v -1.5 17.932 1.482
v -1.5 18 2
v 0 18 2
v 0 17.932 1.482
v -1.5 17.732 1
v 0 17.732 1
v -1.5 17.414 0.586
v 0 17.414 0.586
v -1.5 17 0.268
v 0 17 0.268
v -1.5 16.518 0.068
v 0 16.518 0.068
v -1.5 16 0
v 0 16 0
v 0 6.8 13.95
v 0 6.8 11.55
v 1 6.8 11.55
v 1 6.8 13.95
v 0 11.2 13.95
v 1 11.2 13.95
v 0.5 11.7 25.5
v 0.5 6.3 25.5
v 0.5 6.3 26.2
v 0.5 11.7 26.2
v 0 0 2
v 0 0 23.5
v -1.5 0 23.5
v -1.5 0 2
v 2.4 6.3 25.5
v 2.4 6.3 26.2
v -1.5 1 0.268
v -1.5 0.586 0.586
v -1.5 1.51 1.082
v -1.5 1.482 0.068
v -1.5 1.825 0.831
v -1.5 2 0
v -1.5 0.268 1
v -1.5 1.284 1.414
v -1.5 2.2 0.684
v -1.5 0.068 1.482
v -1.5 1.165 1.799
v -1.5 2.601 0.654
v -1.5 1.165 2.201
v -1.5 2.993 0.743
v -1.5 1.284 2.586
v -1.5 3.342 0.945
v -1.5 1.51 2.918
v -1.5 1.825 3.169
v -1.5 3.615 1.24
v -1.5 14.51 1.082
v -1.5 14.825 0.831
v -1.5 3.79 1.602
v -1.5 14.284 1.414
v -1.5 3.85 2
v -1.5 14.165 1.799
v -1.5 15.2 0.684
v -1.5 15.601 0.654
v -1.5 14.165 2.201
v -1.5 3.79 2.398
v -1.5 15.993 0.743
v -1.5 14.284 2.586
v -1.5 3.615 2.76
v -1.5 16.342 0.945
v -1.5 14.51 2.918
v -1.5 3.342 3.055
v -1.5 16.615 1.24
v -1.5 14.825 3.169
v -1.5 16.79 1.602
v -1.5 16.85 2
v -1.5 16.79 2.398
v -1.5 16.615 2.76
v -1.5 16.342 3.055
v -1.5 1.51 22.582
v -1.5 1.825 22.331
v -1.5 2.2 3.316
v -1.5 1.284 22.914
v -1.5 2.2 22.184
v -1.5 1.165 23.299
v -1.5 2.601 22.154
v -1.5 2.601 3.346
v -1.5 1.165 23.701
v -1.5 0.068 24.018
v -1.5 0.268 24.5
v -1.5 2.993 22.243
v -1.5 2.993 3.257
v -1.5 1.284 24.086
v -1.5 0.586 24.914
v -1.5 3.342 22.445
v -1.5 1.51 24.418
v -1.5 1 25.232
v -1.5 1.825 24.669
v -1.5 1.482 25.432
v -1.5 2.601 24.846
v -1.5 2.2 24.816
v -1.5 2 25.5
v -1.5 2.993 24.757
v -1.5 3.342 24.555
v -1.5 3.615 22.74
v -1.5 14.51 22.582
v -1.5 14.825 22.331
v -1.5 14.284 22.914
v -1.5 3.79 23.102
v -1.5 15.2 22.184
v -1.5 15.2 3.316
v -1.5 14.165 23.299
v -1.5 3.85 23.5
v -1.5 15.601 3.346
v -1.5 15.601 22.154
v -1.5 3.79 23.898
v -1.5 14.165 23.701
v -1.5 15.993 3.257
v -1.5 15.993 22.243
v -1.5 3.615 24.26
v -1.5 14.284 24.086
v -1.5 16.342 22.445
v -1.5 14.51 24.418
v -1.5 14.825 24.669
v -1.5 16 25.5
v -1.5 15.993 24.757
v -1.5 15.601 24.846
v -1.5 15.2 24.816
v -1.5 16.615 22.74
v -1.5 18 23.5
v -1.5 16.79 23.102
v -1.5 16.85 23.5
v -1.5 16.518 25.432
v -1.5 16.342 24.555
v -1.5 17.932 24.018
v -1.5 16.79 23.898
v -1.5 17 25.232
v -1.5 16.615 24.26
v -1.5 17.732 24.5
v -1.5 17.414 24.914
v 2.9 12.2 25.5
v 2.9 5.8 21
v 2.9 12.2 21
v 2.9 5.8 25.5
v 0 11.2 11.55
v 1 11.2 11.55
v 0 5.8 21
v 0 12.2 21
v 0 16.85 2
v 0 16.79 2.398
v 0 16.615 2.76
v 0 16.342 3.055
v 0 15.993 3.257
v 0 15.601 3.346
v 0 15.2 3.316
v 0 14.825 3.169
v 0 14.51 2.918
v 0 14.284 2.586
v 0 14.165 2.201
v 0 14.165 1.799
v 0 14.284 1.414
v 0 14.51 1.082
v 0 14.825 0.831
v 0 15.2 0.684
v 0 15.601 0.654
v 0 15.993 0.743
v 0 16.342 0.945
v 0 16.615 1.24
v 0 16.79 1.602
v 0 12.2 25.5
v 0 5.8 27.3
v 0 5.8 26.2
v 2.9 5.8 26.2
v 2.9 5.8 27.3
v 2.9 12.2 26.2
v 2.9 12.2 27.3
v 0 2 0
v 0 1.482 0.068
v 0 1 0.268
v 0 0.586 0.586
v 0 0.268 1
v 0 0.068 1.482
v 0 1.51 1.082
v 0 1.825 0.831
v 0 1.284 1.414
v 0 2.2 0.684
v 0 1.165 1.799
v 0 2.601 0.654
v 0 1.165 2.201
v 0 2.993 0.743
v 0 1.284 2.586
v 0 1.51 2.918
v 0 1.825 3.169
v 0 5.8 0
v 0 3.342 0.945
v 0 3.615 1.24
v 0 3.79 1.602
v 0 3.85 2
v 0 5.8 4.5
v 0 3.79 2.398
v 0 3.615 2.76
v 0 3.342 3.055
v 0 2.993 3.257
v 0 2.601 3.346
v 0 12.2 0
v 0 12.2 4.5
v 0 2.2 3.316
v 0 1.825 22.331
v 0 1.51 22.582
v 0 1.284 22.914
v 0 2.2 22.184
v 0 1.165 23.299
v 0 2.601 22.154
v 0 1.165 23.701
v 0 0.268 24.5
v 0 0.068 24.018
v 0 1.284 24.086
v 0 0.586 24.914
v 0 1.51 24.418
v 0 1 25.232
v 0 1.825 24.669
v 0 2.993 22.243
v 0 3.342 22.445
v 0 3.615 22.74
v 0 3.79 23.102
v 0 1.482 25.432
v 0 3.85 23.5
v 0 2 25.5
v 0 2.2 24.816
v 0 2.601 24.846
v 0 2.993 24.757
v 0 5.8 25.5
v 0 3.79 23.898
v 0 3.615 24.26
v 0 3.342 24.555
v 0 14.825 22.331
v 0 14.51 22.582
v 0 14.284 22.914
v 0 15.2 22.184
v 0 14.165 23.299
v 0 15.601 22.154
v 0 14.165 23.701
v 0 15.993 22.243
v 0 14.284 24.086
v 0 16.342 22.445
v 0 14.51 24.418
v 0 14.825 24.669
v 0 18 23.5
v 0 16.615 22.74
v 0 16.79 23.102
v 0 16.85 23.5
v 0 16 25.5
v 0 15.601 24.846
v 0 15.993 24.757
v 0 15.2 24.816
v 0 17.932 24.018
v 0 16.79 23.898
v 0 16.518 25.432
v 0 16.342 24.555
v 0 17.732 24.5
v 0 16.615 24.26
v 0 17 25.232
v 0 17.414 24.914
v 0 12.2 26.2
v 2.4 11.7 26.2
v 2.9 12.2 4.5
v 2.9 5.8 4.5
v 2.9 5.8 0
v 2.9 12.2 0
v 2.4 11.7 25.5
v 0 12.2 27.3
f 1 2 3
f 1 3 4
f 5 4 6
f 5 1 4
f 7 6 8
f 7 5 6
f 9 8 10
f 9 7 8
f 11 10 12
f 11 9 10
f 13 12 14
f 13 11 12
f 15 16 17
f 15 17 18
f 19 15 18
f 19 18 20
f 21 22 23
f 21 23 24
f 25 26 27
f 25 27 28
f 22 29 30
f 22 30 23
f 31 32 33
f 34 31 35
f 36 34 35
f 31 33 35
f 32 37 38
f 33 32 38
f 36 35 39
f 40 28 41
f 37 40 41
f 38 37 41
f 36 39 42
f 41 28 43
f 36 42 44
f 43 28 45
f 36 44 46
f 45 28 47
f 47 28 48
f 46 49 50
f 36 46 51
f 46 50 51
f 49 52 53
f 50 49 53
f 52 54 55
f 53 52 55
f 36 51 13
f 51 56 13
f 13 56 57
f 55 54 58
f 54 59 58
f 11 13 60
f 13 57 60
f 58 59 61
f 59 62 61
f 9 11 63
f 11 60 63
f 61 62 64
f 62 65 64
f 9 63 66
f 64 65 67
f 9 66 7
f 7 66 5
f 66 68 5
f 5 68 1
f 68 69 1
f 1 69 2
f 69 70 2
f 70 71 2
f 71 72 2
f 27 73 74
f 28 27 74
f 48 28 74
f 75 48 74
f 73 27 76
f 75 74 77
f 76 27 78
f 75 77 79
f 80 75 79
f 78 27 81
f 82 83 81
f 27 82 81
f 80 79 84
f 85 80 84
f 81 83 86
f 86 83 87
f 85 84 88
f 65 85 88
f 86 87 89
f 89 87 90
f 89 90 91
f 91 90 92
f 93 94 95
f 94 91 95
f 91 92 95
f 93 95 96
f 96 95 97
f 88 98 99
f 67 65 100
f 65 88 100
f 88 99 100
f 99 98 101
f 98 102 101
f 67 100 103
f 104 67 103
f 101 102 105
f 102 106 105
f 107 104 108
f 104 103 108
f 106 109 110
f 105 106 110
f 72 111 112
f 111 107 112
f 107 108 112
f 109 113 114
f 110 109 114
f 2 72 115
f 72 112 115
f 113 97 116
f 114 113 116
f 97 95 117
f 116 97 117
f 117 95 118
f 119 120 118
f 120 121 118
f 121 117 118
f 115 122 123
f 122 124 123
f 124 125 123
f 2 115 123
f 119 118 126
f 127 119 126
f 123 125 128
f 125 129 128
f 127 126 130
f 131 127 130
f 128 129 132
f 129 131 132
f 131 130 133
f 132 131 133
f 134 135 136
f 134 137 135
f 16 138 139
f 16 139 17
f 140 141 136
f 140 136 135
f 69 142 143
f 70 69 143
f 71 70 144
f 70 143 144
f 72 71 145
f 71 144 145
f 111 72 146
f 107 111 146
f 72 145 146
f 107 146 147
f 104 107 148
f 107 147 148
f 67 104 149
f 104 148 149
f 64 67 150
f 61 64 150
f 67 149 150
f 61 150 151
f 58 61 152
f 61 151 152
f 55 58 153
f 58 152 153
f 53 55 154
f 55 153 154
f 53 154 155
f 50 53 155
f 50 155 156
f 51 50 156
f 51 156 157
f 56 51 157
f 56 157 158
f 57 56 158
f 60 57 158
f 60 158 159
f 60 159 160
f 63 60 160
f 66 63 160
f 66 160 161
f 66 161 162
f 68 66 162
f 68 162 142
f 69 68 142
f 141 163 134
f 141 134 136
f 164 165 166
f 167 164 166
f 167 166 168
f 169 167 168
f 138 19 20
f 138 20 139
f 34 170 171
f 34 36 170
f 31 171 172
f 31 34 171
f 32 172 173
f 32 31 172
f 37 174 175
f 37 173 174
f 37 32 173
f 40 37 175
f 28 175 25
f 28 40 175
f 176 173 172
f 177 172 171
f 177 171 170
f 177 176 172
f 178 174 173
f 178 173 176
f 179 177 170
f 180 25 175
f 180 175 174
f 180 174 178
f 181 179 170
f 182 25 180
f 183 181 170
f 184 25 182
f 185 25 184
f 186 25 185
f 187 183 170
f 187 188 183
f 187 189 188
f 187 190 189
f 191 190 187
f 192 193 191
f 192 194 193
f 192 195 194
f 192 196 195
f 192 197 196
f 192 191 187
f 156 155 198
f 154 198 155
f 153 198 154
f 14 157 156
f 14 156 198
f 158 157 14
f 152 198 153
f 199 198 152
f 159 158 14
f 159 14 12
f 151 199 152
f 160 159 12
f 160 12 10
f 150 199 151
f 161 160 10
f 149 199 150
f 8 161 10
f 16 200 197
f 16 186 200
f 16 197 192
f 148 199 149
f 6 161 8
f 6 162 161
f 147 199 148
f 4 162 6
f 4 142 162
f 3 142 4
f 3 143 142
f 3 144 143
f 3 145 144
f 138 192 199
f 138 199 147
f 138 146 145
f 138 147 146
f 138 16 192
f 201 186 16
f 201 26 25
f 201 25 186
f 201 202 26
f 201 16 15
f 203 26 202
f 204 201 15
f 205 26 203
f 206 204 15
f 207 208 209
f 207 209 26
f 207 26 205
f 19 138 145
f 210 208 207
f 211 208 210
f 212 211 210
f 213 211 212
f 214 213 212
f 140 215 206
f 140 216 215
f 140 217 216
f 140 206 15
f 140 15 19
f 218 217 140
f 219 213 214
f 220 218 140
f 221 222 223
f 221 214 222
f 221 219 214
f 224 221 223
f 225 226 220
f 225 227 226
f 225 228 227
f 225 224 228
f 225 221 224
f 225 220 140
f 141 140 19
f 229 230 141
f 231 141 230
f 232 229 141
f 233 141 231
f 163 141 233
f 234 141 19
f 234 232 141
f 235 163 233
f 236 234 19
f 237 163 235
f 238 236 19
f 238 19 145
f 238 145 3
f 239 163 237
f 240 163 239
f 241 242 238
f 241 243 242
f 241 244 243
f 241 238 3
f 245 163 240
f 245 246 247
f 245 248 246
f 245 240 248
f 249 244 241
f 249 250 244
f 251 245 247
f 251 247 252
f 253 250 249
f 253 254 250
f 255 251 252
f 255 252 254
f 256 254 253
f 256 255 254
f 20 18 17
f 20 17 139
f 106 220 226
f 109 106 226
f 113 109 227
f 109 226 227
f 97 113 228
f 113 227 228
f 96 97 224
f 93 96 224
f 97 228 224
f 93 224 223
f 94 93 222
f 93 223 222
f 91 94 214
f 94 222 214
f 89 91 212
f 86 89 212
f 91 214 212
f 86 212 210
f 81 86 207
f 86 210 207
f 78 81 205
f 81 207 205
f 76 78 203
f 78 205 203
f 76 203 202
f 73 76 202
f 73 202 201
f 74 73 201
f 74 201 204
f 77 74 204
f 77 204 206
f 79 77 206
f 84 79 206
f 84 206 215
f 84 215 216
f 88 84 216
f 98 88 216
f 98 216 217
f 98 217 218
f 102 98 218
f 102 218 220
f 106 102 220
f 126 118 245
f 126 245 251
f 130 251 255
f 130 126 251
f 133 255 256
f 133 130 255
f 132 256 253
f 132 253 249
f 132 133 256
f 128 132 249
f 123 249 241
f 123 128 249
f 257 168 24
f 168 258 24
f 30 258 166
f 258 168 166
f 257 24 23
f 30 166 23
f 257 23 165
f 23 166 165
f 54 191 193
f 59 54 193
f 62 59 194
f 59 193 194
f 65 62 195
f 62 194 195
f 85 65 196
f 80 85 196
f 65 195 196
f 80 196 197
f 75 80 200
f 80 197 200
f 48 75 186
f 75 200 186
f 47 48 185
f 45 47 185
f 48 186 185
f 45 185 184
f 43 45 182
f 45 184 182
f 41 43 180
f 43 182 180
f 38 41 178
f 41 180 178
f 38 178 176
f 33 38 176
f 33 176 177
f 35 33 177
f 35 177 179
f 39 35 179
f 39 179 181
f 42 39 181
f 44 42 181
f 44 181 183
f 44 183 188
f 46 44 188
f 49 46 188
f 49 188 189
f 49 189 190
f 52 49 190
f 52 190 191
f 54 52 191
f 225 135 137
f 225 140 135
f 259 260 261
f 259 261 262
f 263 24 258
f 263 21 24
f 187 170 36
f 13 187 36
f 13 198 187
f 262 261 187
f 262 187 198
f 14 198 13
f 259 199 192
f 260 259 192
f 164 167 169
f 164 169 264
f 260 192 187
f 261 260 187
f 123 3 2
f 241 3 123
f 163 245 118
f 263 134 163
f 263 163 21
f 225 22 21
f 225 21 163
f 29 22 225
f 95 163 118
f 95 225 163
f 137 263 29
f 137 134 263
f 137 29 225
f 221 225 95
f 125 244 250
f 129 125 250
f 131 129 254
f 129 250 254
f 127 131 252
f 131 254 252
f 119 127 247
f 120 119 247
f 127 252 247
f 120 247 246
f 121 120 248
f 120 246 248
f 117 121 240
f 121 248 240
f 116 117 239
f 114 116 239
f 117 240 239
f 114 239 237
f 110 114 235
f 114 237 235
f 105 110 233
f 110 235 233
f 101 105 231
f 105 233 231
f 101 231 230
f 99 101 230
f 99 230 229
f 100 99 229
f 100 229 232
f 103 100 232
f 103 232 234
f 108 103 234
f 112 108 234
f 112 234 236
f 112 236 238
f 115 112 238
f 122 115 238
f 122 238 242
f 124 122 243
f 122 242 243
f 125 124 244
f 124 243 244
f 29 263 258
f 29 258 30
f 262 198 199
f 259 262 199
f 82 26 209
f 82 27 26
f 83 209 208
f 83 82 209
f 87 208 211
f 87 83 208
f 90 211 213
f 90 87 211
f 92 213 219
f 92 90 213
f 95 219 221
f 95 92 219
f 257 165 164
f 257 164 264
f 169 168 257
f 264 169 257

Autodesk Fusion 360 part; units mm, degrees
sketch "Sketch1" plane through (0, 0, 0) normal (1, 0, 0) x (0, 1, 0)
  line L0 (0, 0) -> (18, 0)
  line L1 (18, 0) -> (18, 25.5)
  line L2 (18, 25.5) -> (0, 25.5)
  line L3 (0, 25.5) -> (0, 0)
  line L4 (5.8, 25.5) -> (12.2, 25.5)
  line L5 (12.2, 25.5) -> (12.2, 21)
  line L6 (12.2, 21) -> (5.8, 21)
  line L7 (5.8, 21) -> (5.8, 25.5)
  line L8 (9, 0) -> (9, 25.5)
  line L9 (12.2, 23.25) -> (9, 23.25)
  line L10 (5.8, 23.25) -> (9, 23.25)
  line L11 (0, 12.75) -> (18, 12.75)
  line L12 (5.8, 4.5) -> (5.8, 0)
  line L13 (5.8, 0) -> (12.2, 0)
  line L14 (12.2, 0) -> (12.2, 4.5)
  line L15 (12.2, 4.5) -> (5.8, 4.5)
  line L16 (6.8, 13.95) -> (11.2, 13.95)
  line L17 (11.2, 13.95) -> (11.2, 11.55)
  line L18 (11.2, 11.55) -> (6.8, 11.55)
  line L19 (6.8, 11.55) -> (6.8, 13.95)
  line L20 (8, 13.95) -> (8, 12.75)
  line L21 (8, 11.55) -> (8, 12.75)
  line L22 (11.2, 13.3189) -> (9, 13.3189)
  line L23 (6.8, 13.3189) -> (9, 13.3189)
  dimension "d1" = 25.5
  dimension "d2" = 18
  dimension "d3" = 6.4
  dimension "d4" = 4.5
  dimension "d5" = 4.4
  dimension "d6" = 2.4
extrude "Extrude1" add sketch "Sketch1" against normal blind 1.5
extrude "Extrude2" add sketch "Sketch1" along normal blind 2.9 contours L0 L8 L12 L13 L15 | L0 L8 L13 L14 L15 | L2 L4 L7 L8 L10 | L2 L4 L5 L8 L9 | L6 L7 L8 L10 | L5 L6 L8 L9
extrude "Extrude3" add sketch "Sketch1" along normal blind 1 contours L11 L19 L20 L23 | L11 L18 L19 L21 | L8 L11 L20 L23 | L8 L11 L18 L21 | L16 L19 L20 L23 | L8 L11 L17 L18 | L8 L11 L17 L22 | L8 L16 L20 L23 | L8 L16 L17 L22
sketch "Sketch2" plane through (0, 0, 25.5) normal (0, 0, 1) x (-1, 0, 0)
  line L0 (0, -12.2) -> (0, -18)
  line L1 (0, -18) -> (1.5, -18)
  line L2 (1.5, -18) -> (1.5, 0)
  line L3 (1.5, 0) -> (0, 0)
  line L4 (0, 0) -> (0, -5.8)
  line L5 (0, -5.8) -> (-2.9, -5.8)
  line L6 (-2.9, -5.8) -> (-2.9, -12.2)
  line L7 (-2.9, -12.2) -> (0, -12.2)
  line L8 (-2.4, -6.3) -> (-0.5, -6.3)
  line L9 (-0.5, -6.3) -> (-0.5, -11.7)
  line L10 (-0.5, -11.7) -> (-2.4, -11.7)
  line L11 (-2.4, -11.7) -> (-2.4, -6.3)
  line L12 (0, -5.8) -> (0, -12.2)
  dimension "d13" = 0.5
  dimension "d14" = 0.5
  dimension "d15" = 0.5
  dimension "d16" = 0.5
extrude "Extrude4" add sketch "Sketch2" along normal blind 0.7 contours L8 L9 L10 L11
sketch "Sketch3" plane through (0, 0, 26.2) normal (0, 0, 1) x (-1, 0, 0)
  line L0 (-2.4, -11.7) -> (-0.5, -11.7)
  line L1 (-0.5, -11.7) -> (-0.5, -6.3)
  line L2 (-0.5, -6.3) -> (-2.4, -6.3)
  line L3 (-2.4, -6.3) -> (-2.4, -11.7)
  line L4 (-2.4, -11.7) -> (-2.4, -6.3)
  line L5 (-2.4, -6.3) -> (-0.5, -6.3)
  line L6 (-0.5, -6.3) -> (-0.5, -11.7)
  line L7 (-0.5, -11.7) -> (-2.4, -11.7)
  line L8 (0, -12.2) -> (0, -18)
  line L9 (0, -18) -> (1.5, -18)
  line L10 (1.5, -18) -> (1.5, 0)
  line L11 (1.5, 0) -> (0, 0)
  line L12 (0, 0) -> (0, -5.8)
  line L13 (0, -5.8) -> (-2.9, -5.8)
  line L14 (-2.9, -5.8) -> (-2.9, -12.2)
  line L15 (-2.9, -12.2) -> (0, -12.2)
  line L16 (-2.9, -5.8) -> (0, -5.8)
  line L17 (0, -5.8) -> (0, -12.2)
  line L18 (0, -12.2) -> (-2.9, -12.2)
  line L19 (-2.9, -12.2) -> (-2.9, -5.8)
extrude "Extrude5" add sketch "Sketch3" along normal blind 1.1 contours L0 L1 L2 L3 L4 L5 L6 L7 | L13 L14 L15 L16 L17 L18 L19
sketch "Sketch4" plane through (0, 0, 0) normal (1, 0, 0) x (0, 1, 0)
  line L0 (6.8, 11.55) -> (6.8, 13.95)
  line L1 (6.8, 13.95) -> (11.2, 13.95)
  line L2 (11.2, 13.95) -> (11.2, 11.55)
  line L3 (11.2, 11.55) -> (6.8, 11.55)
  line L4 (12.2, 25.5) -> (12.2, 21)
  line L5 (12.2, 21) -> (5.8, 21)
  line L6 (5.8, 21) -> (5.8, 25.5)
  line L7 (5.8, 25.5) -> (0, 25.5)
  line L8 (0, 25.5) -> (0, 0)
  line L9 (0, 0) -> (5.8, 0)
  line L10 (5.8, 0) -> (5.8, 4.5)
  line L11 (5.8, 4.5) -> (12.2, 4.5)
  line L12 (12.2, 4.5) -> (12.2, 0)
  line L13 (12.2, 0) -> (18, 0)
  line L14 (18, 0) -> (18, 25.5)
  line L15 (18, 25.5) -> (12.2, 25.5)
  circle A0 centre (2.5, 23.5) radius 1.35
  line L16 (9, 13.95) -> (9, 20)
  line L17 (6.8, 12.75) -> (1, 12.75)
  circle A1 centre (15.5, 23.5) radius 1.35
  circle A2 centre (2.5, 2) radius 1.35
  circle A3 centre (15.5, 2) radius 1.35
  dimension "d22" = 2.7
  dimension "d23" = 2
  dimension "d24" = 2.5
extrude "Extrude6" cut sketch "Sketch4" against normal blind 4 contours A0 | A1 | A2 | A3
fillet "Fillet1" radius 2 4 edges at (-0.75, 0, 25.5) (-0.75, 18, 25.5) (-0.75, 18, 0) (-0.75, 0, 0)
